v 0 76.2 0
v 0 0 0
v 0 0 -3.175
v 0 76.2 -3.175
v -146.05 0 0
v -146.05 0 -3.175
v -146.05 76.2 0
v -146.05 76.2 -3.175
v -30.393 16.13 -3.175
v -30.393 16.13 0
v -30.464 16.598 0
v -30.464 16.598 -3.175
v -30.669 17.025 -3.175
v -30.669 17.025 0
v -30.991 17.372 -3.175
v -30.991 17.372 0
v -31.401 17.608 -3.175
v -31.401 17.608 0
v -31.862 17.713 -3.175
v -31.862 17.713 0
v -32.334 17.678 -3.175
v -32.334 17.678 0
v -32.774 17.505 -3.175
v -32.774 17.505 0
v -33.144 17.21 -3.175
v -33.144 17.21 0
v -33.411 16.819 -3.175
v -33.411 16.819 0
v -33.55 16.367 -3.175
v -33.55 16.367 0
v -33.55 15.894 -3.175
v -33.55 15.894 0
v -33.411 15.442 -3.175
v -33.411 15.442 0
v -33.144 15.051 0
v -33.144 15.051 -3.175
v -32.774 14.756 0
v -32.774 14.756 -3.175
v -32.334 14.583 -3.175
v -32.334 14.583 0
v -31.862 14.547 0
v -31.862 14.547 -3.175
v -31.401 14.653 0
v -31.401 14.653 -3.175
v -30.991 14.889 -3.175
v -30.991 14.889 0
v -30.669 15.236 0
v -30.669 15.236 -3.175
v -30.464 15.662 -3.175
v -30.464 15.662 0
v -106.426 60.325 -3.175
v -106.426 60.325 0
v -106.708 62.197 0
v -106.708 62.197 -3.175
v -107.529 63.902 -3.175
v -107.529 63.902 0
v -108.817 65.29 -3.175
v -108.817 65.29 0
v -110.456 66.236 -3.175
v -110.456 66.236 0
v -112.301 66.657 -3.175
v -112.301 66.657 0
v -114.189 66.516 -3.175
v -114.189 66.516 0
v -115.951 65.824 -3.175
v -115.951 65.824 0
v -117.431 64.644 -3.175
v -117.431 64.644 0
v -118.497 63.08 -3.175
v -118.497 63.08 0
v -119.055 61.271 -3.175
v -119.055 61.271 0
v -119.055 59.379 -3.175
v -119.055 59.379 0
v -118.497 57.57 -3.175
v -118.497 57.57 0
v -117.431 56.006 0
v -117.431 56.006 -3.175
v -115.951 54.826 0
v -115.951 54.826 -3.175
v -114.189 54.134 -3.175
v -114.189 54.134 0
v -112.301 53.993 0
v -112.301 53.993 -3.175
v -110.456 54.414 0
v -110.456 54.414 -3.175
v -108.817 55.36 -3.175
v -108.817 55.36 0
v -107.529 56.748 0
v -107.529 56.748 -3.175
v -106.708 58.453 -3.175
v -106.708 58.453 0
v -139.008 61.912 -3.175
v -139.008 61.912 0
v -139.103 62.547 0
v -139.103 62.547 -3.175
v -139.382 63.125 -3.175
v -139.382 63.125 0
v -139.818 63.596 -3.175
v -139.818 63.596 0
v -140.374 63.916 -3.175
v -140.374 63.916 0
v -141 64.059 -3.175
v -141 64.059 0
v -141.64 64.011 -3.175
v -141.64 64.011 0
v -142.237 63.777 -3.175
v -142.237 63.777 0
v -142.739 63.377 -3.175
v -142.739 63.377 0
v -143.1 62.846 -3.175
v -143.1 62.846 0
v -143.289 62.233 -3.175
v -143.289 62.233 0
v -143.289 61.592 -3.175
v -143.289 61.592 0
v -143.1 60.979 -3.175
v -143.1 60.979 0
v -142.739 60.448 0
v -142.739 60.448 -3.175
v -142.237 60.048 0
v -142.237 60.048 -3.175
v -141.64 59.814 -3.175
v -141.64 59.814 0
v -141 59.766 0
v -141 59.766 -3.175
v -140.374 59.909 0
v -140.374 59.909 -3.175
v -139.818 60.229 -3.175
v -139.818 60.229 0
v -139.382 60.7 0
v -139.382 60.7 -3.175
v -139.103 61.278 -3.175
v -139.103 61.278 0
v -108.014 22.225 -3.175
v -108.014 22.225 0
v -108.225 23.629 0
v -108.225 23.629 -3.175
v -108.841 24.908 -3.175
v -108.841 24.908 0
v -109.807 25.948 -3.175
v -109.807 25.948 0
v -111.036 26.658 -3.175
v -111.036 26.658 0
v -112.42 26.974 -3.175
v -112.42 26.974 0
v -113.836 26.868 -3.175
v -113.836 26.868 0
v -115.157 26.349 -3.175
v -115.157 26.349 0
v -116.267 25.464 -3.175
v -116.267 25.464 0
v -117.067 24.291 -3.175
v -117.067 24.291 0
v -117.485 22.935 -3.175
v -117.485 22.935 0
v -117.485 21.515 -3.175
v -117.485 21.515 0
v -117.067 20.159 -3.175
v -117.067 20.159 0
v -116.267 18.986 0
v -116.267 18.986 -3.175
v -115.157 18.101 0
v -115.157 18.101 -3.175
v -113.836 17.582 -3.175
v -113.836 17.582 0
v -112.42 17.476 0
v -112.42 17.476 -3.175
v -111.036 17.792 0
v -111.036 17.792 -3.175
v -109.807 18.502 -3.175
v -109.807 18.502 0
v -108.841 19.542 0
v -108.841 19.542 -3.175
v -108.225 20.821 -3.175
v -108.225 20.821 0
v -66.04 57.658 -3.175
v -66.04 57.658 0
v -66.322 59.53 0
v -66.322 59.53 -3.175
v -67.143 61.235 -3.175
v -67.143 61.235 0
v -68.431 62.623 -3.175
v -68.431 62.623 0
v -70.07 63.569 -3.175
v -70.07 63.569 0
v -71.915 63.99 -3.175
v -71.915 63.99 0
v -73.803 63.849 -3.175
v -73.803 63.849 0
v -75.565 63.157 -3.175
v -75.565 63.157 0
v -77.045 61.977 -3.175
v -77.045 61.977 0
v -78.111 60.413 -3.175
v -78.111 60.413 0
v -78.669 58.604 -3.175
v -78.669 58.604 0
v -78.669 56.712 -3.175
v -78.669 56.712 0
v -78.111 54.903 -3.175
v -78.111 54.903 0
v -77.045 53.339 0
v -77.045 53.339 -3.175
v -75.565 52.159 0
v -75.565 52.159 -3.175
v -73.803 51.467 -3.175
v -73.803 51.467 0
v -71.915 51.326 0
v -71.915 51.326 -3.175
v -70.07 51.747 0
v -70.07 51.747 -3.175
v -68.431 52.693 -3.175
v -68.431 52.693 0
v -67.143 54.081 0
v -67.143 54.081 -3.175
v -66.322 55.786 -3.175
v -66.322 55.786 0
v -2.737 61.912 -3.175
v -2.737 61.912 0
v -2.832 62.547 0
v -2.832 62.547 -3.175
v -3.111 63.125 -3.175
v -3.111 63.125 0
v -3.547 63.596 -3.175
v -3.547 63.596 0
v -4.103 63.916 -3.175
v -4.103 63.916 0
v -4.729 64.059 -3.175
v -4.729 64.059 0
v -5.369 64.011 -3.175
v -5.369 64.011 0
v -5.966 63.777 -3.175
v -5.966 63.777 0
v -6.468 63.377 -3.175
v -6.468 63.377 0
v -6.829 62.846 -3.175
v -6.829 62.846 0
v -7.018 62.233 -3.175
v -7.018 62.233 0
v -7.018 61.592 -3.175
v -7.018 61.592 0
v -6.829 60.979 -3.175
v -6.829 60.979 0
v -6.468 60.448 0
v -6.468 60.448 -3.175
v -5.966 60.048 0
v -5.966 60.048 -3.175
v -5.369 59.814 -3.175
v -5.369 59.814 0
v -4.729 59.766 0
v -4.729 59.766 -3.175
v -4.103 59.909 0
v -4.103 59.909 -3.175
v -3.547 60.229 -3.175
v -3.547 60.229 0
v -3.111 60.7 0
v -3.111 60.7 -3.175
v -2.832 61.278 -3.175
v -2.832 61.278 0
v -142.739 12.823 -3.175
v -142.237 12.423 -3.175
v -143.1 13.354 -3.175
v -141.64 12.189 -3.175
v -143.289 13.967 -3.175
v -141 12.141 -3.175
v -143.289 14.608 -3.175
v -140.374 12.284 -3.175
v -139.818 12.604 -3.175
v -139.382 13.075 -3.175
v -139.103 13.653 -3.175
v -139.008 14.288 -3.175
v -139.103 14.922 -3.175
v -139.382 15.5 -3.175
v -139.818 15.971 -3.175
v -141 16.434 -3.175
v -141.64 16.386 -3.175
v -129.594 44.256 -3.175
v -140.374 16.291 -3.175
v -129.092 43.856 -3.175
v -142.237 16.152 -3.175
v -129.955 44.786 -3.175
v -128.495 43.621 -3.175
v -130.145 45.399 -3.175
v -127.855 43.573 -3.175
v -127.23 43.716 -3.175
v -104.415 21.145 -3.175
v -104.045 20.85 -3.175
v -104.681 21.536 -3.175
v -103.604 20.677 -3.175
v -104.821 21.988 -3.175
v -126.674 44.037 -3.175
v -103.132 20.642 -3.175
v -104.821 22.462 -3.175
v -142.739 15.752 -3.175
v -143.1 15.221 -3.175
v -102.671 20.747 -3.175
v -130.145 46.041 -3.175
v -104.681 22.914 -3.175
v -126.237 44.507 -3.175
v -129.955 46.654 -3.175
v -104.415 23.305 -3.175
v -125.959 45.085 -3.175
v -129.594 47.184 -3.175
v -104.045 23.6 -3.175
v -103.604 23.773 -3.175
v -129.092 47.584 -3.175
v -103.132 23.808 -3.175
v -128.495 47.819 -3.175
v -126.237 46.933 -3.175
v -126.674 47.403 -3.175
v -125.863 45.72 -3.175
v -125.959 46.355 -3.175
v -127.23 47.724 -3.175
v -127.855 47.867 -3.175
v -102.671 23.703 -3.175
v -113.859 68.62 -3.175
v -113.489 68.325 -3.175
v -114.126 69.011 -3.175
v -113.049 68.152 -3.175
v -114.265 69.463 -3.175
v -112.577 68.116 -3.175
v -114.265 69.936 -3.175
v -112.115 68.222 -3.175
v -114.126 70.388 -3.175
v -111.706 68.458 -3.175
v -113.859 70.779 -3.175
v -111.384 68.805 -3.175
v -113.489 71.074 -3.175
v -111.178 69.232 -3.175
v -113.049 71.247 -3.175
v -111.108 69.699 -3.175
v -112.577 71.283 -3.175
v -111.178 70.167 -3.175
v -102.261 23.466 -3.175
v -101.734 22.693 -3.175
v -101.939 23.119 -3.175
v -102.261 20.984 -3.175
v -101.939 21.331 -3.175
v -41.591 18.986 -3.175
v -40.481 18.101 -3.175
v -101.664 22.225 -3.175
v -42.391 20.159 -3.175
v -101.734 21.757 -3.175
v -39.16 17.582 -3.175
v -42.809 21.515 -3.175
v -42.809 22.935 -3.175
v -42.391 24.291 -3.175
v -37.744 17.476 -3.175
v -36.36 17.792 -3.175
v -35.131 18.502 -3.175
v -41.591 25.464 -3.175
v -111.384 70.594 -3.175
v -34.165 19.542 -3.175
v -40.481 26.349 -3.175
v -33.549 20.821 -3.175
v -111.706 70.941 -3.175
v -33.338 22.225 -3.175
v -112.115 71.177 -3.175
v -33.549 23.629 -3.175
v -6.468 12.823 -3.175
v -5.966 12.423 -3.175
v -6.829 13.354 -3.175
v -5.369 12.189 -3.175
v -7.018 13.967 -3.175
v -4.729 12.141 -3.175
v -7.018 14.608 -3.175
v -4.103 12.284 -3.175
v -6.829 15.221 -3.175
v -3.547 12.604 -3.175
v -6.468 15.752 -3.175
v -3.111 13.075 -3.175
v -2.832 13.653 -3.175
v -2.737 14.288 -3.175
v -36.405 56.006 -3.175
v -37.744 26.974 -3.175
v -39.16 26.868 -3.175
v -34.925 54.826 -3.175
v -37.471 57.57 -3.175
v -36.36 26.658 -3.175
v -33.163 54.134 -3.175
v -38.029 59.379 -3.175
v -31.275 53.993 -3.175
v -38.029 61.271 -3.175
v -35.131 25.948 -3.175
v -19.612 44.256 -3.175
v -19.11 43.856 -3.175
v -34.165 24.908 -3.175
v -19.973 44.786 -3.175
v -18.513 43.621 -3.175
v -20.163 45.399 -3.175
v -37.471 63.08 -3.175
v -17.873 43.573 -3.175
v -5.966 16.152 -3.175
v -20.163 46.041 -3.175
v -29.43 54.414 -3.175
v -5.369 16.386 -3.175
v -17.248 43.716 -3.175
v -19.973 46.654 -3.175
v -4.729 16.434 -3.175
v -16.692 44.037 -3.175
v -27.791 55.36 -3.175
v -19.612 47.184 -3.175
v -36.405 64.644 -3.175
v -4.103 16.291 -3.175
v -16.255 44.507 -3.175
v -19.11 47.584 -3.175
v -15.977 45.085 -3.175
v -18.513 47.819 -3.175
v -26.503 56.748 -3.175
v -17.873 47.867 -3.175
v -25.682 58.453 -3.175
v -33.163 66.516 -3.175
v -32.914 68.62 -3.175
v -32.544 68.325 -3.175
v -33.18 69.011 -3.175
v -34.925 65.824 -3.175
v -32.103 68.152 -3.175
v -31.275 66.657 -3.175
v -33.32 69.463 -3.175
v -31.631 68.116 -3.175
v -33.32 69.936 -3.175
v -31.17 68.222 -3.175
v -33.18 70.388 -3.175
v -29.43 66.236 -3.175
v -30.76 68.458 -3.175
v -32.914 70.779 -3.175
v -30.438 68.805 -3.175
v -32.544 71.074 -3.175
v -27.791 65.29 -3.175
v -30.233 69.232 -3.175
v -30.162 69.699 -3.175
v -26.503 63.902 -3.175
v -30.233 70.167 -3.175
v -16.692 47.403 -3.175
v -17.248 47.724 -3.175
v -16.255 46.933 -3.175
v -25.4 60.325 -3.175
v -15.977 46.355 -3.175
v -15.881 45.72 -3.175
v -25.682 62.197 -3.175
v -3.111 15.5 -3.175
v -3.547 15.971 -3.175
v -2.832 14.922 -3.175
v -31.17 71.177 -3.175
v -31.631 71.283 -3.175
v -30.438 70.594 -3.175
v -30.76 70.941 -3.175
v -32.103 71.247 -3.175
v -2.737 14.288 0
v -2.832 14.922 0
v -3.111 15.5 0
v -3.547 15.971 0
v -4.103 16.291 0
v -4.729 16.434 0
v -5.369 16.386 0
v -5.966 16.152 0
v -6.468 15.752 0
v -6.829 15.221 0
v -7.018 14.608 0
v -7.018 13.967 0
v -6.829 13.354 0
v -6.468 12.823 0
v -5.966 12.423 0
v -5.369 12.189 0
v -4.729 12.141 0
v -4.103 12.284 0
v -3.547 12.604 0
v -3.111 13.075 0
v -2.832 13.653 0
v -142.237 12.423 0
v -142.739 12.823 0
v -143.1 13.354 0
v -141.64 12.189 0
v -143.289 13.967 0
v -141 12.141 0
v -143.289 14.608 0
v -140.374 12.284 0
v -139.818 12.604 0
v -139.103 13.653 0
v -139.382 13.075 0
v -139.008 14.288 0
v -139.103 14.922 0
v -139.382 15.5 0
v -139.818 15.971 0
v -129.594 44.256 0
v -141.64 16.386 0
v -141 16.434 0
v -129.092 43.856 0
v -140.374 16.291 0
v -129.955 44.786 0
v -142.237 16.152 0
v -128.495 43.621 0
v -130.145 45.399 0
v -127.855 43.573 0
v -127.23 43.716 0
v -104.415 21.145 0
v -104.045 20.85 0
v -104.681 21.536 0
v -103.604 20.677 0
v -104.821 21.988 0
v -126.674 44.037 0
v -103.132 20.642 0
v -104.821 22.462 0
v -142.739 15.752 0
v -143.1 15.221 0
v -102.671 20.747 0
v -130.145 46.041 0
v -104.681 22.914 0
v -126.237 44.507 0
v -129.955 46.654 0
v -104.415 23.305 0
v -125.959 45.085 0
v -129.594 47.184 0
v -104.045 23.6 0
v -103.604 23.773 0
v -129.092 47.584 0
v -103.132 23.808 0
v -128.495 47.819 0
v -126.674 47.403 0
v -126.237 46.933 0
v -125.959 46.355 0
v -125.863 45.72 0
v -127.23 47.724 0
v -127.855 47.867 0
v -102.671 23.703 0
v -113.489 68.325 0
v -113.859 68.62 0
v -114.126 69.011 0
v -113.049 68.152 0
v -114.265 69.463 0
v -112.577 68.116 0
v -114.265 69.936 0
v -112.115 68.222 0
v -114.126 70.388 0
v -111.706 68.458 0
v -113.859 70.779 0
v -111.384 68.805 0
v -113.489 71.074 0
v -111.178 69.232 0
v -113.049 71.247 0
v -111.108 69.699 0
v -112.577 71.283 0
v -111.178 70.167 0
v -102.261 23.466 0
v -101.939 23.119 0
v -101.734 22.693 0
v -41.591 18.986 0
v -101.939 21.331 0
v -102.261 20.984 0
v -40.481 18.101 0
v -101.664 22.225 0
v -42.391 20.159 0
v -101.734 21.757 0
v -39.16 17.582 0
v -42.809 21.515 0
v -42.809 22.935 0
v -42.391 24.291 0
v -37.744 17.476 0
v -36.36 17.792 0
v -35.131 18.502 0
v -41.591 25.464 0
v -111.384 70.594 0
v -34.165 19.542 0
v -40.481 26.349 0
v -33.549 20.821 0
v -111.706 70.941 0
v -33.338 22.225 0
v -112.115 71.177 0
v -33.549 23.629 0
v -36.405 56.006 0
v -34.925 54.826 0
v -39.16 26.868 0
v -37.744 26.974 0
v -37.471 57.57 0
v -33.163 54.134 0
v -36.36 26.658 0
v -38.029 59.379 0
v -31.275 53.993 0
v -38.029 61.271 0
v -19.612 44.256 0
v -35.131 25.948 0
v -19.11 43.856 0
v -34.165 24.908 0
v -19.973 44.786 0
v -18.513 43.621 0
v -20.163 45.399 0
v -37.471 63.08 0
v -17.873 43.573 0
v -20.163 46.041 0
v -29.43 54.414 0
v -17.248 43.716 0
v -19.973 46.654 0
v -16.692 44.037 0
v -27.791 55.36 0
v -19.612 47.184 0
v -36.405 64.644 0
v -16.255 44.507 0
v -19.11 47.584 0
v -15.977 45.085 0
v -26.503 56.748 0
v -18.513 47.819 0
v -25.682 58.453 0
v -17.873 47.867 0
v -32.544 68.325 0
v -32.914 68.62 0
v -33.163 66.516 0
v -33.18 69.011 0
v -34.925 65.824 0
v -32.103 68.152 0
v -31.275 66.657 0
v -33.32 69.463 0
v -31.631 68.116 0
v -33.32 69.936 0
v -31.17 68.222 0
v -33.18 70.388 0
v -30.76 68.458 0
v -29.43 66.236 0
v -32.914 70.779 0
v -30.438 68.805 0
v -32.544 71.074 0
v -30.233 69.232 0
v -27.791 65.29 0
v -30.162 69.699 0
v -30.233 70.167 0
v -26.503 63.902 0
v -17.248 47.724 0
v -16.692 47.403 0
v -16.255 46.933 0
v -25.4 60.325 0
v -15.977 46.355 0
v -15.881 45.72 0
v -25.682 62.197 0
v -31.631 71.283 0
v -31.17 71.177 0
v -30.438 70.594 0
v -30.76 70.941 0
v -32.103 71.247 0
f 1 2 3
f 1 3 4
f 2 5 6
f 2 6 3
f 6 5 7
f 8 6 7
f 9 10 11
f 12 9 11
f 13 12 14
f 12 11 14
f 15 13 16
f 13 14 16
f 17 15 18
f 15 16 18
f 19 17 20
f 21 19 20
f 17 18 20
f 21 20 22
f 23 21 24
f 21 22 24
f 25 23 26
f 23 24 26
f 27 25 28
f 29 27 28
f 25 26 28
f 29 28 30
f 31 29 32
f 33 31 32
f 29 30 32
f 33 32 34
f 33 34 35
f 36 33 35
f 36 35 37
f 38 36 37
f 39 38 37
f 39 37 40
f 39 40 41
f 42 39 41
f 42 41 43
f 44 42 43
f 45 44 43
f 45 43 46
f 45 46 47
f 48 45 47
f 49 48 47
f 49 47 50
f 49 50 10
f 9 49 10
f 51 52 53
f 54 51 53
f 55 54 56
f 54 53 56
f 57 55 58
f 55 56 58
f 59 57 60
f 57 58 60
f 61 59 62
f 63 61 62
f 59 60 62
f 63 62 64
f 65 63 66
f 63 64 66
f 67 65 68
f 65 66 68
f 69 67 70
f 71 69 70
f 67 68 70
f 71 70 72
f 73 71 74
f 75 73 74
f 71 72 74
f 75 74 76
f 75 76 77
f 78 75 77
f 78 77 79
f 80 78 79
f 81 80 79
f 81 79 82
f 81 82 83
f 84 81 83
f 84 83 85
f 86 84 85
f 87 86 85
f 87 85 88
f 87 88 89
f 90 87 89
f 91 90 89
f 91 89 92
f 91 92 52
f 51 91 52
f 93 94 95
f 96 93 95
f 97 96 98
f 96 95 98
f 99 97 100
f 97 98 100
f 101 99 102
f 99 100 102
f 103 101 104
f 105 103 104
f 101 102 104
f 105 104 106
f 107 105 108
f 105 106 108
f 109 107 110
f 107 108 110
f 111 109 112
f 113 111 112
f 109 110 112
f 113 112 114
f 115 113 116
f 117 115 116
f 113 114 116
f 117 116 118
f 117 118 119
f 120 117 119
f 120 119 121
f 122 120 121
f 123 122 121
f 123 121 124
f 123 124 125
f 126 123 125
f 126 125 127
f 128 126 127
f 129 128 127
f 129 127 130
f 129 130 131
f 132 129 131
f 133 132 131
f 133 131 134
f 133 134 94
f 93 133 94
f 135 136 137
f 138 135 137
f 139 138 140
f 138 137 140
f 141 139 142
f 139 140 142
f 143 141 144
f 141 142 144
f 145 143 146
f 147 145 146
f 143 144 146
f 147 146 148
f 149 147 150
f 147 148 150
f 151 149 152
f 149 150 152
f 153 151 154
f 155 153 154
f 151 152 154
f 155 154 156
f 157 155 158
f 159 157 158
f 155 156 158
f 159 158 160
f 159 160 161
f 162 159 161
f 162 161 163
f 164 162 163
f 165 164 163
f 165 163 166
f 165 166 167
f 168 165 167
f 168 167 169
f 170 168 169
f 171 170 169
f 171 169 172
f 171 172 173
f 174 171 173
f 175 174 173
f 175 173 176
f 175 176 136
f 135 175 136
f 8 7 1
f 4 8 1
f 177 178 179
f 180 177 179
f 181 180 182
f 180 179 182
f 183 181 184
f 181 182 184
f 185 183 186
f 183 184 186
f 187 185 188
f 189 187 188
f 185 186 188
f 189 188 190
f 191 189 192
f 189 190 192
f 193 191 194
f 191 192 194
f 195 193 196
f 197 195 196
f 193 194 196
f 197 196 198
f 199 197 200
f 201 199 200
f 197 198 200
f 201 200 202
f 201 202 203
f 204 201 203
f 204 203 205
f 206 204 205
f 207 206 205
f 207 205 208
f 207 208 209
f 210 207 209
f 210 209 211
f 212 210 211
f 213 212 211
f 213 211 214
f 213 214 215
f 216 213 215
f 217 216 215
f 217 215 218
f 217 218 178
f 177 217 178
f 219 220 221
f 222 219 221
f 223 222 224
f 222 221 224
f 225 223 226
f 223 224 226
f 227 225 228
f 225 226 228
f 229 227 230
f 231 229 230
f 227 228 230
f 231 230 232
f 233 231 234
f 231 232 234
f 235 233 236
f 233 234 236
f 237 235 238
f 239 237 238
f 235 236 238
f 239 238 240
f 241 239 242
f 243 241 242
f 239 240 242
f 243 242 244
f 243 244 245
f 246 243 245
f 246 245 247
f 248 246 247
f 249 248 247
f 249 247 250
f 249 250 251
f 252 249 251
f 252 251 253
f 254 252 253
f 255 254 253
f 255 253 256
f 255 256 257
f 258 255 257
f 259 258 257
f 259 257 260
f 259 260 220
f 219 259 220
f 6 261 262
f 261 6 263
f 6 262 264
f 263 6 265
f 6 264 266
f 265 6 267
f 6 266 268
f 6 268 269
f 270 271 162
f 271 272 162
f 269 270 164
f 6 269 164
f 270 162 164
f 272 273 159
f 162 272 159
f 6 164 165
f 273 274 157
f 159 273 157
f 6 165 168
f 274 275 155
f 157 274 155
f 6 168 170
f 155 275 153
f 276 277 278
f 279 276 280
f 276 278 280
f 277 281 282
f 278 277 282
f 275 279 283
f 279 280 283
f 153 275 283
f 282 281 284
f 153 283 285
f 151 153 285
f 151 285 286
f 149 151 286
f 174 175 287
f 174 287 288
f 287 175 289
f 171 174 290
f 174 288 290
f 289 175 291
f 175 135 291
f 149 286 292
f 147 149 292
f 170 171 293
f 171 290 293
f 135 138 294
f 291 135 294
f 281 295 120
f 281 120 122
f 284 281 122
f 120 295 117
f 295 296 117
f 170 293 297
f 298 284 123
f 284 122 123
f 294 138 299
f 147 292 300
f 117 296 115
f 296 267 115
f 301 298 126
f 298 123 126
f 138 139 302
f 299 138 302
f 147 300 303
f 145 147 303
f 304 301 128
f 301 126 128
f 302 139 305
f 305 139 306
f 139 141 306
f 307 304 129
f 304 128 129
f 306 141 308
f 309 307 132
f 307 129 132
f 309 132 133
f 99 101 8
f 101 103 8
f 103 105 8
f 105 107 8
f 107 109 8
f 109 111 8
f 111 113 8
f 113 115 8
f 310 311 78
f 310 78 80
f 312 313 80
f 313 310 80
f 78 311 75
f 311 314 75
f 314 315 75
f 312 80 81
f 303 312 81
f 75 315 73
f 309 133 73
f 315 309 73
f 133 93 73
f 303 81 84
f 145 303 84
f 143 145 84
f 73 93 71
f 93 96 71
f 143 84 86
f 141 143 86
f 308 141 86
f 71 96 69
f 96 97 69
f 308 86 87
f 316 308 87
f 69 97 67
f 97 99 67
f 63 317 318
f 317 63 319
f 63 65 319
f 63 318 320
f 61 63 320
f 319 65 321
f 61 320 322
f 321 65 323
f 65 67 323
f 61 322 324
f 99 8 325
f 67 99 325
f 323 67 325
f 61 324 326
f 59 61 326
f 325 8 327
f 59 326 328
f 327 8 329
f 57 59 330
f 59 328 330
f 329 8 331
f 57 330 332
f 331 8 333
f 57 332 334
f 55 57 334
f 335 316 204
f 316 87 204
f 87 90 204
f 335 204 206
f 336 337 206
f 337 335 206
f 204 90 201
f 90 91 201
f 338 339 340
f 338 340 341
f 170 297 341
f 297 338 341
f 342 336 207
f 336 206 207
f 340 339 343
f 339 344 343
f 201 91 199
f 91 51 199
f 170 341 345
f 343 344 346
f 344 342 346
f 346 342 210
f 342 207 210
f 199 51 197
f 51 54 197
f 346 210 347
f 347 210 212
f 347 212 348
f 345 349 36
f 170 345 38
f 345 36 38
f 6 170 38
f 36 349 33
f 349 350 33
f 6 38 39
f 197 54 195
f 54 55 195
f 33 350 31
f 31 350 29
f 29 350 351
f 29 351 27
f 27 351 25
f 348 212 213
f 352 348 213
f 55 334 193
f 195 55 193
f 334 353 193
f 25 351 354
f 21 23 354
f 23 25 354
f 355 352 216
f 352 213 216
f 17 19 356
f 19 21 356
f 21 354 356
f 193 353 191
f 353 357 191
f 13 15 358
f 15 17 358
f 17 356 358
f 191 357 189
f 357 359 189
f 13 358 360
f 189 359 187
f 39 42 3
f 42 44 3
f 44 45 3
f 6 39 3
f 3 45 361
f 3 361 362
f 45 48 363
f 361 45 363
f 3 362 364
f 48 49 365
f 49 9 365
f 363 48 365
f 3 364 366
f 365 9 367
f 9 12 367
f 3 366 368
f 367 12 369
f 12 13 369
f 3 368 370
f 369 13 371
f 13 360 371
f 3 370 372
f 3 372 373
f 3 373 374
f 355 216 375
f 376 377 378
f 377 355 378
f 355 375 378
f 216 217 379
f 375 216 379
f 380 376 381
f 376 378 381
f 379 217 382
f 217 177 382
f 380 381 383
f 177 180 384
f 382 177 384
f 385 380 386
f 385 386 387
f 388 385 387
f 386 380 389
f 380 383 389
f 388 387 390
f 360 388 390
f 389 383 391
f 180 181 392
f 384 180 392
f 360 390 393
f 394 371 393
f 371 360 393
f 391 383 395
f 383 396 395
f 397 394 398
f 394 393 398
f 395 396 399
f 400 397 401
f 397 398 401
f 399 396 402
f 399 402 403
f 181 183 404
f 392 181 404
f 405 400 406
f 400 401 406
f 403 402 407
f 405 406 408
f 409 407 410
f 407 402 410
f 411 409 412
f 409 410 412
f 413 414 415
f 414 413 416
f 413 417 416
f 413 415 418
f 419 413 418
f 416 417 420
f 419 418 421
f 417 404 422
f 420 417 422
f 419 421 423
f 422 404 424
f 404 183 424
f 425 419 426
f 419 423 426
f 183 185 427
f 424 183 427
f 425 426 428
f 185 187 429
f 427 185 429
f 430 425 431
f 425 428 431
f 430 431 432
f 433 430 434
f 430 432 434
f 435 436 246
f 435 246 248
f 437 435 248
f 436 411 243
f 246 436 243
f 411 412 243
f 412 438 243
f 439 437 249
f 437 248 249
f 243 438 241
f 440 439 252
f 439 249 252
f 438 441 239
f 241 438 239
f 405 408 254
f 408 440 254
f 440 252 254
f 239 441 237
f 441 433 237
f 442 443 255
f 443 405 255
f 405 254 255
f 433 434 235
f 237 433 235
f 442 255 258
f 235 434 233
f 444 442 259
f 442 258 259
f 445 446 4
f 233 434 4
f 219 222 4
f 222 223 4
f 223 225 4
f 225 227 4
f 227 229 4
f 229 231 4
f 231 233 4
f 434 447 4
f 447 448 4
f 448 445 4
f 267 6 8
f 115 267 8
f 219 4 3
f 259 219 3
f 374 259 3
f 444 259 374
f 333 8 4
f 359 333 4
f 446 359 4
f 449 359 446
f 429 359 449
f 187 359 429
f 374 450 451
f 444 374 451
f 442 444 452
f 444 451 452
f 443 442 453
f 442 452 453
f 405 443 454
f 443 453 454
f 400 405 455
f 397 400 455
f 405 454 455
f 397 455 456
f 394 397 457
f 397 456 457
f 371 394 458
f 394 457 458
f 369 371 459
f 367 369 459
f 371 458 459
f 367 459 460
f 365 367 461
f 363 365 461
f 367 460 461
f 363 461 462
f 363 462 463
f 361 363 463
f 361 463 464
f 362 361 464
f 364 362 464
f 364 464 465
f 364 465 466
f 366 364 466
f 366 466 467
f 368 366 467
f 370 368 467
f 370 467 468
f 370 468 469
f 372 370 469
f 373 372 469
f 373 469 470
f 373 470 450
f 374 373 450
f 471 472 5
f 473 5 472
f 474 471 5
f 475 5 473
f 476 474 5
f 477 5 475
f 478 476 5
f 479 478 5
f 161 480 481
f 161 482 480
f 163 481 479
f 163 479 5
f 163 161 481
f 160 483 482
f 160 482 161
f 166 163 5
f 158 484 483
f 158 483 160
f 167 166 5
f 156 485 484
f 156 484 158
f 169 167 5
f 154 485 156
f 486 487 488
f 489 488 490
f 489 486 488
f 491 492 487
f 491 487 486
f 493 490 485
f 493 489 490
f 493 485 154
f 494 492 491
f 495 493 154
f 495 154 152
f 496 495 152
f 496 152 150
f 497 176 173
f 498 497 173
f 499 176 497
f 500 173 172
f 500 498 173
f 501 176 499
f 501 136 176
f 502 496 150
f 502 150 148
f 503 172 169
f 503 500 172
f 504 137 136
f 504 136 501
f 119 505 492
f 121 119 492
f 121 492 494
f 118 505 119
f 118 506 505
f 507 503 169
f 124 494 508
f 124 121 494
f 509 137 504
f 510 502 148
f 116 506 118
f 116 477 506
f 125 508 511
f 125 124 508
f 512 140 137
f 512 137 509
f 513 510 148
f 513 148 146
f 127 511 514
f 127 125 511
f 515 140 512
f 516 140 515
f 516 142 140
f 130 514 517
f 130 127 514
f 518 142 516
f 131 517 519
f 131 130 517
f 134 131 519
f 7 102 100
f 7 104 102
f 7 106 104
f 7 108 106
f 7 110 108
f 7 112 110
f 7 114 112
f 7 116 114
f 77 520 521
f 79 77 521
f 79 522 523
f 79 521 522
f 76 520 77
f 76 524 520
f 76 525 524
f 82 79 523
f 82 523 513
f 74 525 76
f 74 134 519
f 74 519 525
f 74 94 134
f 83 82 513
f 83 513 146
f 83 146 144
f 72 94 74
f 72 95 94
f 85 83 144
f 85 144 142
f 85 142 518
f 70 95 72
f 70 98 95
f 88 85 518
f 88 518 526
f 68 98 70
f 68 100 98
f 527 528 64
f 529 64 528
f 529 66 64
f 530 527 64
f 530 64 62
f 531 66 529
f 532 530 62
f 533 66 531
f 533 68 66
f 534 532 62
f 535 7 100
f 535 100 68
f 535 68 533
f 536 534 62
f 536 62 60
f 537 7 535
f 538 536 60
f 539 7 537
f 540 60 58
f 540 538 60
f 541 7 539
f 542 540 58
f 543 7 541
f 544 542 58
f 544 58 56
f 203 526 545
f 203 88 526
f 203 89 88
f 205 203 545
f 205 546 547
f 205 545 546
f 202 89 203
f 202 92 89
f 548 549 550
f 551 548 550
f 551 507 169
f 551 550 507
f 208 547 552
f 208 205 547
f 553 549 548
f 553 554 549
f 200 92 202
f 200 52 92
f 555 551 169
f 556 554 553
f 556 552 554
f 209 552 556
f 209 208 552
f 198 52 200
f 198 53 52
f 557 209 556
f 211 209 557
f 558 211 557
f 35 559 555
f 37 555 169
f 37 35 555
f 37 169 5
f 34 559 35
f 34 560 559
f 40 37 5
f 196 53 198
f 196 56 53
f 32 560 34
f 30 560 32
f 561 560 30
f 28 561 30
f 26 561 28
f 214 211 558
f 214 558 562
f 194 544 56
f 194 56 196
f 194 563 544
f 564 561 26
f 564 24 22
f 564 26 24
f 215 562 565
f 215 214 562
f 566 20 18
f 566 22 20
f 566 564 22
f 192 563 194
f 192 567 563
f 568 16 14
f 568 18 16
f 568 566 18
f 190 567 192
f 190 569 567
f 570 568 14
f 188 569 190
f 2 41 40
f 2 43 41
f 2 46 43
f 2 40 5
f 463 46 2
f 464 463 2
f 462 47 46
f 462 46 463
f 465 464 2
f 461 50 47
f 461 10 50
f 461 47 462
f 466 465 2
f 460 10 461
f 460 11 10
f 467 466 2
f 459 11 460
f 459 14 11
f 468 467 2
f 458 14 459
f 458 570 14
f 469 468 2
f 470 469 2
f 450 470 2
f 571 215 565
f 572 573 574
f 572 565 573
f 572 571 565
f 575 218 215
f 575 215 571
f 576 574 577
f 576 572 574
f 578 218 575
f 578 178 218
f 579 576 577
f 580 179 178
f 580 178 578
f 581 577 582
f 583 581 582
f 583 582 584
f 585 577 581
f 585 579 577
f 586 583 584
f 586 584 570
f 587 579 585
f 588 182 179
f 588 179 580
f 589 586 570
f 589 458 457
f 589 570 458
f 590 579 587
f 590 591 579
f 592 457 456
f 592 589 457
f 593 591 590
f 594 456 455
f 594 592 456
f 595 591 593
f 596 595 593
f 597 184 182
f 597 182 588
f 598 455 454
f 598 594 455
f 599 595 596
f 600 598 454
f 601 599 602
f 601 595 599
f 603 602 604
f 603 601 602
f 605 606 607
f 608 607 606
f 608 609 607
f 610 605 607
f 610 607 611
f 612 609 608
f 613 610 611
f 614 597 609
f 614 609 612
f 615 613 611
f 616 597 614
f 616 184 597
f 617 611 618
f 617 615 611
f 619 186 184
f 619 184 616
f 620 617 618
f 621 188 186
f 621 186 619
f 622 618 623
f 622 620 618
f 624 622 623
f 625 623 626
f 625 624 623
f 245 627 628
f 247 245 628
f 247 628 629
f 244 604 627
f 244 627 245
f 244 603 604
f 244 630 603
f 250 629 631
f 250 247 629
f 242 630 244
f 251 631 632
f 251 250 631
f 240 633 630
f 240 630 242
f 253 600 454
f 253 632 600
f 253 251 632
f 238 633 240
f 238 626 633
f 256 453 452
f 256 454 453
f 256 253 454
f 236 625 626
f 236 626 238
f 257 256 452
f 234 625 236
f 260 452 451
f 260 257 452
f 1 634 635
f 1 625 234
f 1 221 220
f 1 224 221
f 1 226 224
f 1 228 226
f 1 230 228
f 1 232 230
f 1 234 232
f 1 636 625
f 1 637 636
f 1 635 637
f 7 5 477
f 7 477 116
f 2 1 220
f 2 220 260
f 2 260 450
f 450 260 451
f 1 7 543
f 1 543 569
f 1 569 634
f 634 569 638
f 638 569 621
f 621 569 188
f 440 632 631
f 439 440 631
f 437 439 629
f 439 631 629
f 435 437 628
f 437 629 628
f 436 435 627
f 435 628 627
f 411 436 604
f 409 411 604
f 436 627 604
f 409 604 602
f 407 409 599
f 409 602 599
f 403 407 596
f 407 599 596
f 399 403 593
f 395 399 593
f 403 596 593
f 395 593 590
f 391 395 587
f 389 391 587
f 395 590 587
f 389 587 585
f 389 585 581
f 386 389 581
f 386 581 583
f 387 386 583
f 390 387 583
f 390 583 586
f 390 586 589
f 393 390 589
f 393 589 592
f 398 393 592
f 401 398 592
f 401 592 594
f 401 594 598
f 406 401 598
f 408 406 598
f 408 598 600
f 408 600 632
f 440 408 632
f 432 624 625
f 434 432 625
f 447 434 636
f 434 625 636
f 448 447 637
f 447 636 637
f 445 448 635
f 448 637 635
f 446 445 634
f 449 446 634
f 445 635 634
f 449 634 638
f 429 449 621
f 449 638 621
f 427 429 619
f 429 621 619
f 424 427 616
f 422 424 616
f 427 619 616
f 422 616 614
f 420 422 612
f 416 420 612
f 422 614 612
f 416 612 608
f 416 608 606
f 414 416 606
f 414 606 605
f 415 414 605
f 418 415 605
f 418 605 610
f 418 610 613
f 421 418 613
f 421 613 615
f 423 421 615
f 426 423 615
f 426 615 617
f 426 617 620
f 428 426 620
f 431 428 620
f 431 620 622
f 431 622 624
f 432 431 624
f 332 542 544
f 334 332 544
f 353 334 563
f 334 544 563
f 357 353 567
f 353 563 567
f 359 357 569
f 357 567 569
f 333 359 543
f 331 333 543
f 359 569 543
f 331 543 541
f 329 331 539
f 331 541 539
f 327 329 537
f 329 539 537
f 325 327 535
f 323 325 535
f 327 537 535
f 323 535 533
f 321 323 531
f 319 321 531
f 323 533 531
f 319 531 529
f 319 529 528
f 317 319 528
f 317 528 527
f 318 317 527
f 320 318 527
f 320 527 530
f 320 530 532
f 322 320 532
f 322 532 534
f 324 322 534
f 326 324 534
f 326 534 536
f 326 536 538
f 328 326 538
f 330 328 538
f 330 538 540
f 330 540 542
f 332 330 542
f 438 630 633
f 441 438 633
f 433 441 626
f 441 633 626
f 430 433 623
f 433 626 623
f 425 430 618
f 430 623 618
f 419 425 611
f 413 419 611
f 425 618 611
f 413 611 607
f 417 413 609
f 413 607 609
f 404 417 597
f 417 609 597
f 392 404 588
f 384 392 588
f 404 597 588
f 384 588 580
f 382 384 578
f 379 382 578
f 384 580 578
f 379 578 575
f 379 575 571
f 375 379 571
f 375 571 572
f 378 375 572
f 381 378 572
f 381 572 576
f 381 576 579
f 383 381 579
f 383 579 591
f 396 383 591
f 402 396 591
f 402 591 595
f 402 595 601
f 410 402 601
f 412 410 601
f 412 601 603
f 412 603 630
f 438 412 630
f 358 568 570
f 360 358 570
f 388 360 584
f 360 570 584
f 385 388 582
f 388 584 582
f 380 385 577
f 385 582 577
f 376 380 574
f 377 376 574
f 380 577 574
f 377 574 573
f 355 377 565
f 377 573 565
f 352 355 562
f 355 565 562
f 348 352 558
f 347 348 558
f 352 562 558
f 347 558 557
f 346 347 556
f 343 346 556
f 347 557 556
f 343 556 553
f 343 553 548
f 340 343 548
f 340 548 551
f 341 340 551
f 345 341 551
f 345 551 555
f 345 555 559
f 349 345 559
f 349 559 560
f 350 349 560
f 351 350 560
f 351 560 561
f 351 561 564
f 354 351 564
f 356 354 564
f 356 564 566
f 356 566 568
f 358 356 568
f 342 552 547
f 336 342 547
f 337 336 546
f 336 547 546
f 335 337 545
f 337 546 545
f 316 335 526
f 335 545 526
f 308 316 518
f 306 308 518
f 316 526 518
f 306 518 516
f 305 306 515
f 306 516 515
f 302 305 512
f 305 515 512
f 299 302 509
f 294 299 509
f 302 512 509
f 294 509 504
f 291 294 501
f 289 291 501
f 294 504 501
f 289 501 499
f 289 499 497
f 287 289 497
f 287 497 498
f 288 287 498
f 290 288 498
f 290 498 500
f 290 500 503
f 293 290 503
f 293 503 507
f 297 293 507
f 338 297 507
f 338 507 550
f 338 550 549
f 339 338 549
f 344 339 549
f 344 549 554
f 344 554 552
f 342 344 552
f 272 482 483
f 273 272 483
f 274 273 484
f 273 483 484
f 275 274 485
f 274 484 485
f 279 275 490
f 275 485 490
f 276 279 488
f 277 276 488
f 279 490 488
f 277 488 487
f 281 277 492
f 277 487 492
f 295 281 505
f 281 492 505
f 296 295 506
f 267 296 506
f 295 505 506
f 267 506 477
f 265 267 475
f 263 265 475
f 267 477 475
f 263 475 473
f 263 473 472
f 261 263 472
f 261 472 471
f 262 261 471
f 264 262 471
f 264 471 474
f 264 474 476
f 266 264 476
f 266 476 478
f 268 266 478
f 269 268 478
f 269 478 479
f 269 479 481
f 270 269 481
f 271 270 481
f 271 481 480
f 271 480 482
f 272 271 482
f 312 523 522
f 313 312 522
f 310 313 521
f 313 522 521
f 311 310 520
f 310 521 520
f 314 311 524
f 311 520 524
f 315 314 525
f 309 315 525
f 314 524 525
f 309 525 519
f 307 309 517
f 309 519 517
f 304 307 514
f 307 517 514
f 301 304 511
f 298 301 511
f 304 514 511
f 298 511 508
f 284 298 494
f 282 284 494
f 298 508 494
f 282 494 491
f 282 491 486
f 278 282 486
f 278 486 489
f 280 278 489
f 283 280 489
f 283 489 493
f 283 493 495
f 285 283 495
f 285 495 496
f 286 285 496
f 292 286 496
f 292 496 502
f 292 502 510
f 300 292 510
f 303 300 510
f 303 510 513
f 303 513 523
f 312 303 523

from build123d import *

# Parameters (mm, degrees)
SKETCH1_W                    = 146.05
SKETCH1_H                    = 76.2
BOSS_EXTRUDE1_DEPTH          = 3.175
F_6_CLEARANCE_HOLE1_D        = 4.3053
F_1_2_0_5_DIAMETER_HOLE1_D   = 12.7
F_3_8_0_375_DIAMETER_HOLE1_D = 9.525
F_1_8_0_125_DIAMETER_HOLE1_D = 3.175


with BuildPart() as part:
    # Sketch1 → Boss-Extrude1 (new body)
    with BuildSketch(Plane.XY):
        with Locations((-73.025, 38.1)):
            Rectangle(SKETCH1_W, SKETCH1_H)
    extrude(amount=-BOSS_EXTRUDE1_DEPTH)

    # #6 Clearance Hole1 (through all)
    with Locations(Plane(origin=(0, 0, -3.175), x_dir=(-1, 0, 0), z_dir=(0, 0, -1))):
        with Locations((4.8895, 61.9125), (4.8895, 14.2875), (141.1605, 14.2875), (141.1605, 61.9125), (128.016, 45.72), (18.034, 45.72)):
            Hole(F_6_CLEARANCE_HOLE1_D / 2)

    # 1/2 (0.5) Diameter Hole1 (through all)
    with Locations(Plane(origin=(0, 0, -3.175), x_dir=(-1, 0, 0), z_dir=(0, 0, -1))):
        with Locations((31.75, 60.325), (72.39, 57.658), (112.776, 60.325)):
            Hole(F_1_2_0_5_DIAMETER_HOLE1_D / 2)

    # 3/8 (0.375) Diameter Hole1 (through all)
    with Locations(Plane(origin=(0, 0, -3.175), x_dir=(-1, 0, 0), z_dir=(0, 0, -1))):
        with Locations((38.1, 22.225), (112.776, 22.225)):
            Hole(F_3_8_0_375_DIAMETER_HOLE1_D / 2)

    # 1/8 (0.125) Diameter Hole1 (through all)
    with Locations(Plane(origin=(0, 0, -3.175), x_dir=(-1, 0, 0), z_dir=(0, 0, -1))):
        with Locations((31.75, 69.699492067), (112.695431447, 69.699492067), (103.251, 22.225), (31.98067476, 16.130346764)):
            Hole(F_1_8_0_125_DIAMETER_HOLE1_D / 2)


solid = part.part
